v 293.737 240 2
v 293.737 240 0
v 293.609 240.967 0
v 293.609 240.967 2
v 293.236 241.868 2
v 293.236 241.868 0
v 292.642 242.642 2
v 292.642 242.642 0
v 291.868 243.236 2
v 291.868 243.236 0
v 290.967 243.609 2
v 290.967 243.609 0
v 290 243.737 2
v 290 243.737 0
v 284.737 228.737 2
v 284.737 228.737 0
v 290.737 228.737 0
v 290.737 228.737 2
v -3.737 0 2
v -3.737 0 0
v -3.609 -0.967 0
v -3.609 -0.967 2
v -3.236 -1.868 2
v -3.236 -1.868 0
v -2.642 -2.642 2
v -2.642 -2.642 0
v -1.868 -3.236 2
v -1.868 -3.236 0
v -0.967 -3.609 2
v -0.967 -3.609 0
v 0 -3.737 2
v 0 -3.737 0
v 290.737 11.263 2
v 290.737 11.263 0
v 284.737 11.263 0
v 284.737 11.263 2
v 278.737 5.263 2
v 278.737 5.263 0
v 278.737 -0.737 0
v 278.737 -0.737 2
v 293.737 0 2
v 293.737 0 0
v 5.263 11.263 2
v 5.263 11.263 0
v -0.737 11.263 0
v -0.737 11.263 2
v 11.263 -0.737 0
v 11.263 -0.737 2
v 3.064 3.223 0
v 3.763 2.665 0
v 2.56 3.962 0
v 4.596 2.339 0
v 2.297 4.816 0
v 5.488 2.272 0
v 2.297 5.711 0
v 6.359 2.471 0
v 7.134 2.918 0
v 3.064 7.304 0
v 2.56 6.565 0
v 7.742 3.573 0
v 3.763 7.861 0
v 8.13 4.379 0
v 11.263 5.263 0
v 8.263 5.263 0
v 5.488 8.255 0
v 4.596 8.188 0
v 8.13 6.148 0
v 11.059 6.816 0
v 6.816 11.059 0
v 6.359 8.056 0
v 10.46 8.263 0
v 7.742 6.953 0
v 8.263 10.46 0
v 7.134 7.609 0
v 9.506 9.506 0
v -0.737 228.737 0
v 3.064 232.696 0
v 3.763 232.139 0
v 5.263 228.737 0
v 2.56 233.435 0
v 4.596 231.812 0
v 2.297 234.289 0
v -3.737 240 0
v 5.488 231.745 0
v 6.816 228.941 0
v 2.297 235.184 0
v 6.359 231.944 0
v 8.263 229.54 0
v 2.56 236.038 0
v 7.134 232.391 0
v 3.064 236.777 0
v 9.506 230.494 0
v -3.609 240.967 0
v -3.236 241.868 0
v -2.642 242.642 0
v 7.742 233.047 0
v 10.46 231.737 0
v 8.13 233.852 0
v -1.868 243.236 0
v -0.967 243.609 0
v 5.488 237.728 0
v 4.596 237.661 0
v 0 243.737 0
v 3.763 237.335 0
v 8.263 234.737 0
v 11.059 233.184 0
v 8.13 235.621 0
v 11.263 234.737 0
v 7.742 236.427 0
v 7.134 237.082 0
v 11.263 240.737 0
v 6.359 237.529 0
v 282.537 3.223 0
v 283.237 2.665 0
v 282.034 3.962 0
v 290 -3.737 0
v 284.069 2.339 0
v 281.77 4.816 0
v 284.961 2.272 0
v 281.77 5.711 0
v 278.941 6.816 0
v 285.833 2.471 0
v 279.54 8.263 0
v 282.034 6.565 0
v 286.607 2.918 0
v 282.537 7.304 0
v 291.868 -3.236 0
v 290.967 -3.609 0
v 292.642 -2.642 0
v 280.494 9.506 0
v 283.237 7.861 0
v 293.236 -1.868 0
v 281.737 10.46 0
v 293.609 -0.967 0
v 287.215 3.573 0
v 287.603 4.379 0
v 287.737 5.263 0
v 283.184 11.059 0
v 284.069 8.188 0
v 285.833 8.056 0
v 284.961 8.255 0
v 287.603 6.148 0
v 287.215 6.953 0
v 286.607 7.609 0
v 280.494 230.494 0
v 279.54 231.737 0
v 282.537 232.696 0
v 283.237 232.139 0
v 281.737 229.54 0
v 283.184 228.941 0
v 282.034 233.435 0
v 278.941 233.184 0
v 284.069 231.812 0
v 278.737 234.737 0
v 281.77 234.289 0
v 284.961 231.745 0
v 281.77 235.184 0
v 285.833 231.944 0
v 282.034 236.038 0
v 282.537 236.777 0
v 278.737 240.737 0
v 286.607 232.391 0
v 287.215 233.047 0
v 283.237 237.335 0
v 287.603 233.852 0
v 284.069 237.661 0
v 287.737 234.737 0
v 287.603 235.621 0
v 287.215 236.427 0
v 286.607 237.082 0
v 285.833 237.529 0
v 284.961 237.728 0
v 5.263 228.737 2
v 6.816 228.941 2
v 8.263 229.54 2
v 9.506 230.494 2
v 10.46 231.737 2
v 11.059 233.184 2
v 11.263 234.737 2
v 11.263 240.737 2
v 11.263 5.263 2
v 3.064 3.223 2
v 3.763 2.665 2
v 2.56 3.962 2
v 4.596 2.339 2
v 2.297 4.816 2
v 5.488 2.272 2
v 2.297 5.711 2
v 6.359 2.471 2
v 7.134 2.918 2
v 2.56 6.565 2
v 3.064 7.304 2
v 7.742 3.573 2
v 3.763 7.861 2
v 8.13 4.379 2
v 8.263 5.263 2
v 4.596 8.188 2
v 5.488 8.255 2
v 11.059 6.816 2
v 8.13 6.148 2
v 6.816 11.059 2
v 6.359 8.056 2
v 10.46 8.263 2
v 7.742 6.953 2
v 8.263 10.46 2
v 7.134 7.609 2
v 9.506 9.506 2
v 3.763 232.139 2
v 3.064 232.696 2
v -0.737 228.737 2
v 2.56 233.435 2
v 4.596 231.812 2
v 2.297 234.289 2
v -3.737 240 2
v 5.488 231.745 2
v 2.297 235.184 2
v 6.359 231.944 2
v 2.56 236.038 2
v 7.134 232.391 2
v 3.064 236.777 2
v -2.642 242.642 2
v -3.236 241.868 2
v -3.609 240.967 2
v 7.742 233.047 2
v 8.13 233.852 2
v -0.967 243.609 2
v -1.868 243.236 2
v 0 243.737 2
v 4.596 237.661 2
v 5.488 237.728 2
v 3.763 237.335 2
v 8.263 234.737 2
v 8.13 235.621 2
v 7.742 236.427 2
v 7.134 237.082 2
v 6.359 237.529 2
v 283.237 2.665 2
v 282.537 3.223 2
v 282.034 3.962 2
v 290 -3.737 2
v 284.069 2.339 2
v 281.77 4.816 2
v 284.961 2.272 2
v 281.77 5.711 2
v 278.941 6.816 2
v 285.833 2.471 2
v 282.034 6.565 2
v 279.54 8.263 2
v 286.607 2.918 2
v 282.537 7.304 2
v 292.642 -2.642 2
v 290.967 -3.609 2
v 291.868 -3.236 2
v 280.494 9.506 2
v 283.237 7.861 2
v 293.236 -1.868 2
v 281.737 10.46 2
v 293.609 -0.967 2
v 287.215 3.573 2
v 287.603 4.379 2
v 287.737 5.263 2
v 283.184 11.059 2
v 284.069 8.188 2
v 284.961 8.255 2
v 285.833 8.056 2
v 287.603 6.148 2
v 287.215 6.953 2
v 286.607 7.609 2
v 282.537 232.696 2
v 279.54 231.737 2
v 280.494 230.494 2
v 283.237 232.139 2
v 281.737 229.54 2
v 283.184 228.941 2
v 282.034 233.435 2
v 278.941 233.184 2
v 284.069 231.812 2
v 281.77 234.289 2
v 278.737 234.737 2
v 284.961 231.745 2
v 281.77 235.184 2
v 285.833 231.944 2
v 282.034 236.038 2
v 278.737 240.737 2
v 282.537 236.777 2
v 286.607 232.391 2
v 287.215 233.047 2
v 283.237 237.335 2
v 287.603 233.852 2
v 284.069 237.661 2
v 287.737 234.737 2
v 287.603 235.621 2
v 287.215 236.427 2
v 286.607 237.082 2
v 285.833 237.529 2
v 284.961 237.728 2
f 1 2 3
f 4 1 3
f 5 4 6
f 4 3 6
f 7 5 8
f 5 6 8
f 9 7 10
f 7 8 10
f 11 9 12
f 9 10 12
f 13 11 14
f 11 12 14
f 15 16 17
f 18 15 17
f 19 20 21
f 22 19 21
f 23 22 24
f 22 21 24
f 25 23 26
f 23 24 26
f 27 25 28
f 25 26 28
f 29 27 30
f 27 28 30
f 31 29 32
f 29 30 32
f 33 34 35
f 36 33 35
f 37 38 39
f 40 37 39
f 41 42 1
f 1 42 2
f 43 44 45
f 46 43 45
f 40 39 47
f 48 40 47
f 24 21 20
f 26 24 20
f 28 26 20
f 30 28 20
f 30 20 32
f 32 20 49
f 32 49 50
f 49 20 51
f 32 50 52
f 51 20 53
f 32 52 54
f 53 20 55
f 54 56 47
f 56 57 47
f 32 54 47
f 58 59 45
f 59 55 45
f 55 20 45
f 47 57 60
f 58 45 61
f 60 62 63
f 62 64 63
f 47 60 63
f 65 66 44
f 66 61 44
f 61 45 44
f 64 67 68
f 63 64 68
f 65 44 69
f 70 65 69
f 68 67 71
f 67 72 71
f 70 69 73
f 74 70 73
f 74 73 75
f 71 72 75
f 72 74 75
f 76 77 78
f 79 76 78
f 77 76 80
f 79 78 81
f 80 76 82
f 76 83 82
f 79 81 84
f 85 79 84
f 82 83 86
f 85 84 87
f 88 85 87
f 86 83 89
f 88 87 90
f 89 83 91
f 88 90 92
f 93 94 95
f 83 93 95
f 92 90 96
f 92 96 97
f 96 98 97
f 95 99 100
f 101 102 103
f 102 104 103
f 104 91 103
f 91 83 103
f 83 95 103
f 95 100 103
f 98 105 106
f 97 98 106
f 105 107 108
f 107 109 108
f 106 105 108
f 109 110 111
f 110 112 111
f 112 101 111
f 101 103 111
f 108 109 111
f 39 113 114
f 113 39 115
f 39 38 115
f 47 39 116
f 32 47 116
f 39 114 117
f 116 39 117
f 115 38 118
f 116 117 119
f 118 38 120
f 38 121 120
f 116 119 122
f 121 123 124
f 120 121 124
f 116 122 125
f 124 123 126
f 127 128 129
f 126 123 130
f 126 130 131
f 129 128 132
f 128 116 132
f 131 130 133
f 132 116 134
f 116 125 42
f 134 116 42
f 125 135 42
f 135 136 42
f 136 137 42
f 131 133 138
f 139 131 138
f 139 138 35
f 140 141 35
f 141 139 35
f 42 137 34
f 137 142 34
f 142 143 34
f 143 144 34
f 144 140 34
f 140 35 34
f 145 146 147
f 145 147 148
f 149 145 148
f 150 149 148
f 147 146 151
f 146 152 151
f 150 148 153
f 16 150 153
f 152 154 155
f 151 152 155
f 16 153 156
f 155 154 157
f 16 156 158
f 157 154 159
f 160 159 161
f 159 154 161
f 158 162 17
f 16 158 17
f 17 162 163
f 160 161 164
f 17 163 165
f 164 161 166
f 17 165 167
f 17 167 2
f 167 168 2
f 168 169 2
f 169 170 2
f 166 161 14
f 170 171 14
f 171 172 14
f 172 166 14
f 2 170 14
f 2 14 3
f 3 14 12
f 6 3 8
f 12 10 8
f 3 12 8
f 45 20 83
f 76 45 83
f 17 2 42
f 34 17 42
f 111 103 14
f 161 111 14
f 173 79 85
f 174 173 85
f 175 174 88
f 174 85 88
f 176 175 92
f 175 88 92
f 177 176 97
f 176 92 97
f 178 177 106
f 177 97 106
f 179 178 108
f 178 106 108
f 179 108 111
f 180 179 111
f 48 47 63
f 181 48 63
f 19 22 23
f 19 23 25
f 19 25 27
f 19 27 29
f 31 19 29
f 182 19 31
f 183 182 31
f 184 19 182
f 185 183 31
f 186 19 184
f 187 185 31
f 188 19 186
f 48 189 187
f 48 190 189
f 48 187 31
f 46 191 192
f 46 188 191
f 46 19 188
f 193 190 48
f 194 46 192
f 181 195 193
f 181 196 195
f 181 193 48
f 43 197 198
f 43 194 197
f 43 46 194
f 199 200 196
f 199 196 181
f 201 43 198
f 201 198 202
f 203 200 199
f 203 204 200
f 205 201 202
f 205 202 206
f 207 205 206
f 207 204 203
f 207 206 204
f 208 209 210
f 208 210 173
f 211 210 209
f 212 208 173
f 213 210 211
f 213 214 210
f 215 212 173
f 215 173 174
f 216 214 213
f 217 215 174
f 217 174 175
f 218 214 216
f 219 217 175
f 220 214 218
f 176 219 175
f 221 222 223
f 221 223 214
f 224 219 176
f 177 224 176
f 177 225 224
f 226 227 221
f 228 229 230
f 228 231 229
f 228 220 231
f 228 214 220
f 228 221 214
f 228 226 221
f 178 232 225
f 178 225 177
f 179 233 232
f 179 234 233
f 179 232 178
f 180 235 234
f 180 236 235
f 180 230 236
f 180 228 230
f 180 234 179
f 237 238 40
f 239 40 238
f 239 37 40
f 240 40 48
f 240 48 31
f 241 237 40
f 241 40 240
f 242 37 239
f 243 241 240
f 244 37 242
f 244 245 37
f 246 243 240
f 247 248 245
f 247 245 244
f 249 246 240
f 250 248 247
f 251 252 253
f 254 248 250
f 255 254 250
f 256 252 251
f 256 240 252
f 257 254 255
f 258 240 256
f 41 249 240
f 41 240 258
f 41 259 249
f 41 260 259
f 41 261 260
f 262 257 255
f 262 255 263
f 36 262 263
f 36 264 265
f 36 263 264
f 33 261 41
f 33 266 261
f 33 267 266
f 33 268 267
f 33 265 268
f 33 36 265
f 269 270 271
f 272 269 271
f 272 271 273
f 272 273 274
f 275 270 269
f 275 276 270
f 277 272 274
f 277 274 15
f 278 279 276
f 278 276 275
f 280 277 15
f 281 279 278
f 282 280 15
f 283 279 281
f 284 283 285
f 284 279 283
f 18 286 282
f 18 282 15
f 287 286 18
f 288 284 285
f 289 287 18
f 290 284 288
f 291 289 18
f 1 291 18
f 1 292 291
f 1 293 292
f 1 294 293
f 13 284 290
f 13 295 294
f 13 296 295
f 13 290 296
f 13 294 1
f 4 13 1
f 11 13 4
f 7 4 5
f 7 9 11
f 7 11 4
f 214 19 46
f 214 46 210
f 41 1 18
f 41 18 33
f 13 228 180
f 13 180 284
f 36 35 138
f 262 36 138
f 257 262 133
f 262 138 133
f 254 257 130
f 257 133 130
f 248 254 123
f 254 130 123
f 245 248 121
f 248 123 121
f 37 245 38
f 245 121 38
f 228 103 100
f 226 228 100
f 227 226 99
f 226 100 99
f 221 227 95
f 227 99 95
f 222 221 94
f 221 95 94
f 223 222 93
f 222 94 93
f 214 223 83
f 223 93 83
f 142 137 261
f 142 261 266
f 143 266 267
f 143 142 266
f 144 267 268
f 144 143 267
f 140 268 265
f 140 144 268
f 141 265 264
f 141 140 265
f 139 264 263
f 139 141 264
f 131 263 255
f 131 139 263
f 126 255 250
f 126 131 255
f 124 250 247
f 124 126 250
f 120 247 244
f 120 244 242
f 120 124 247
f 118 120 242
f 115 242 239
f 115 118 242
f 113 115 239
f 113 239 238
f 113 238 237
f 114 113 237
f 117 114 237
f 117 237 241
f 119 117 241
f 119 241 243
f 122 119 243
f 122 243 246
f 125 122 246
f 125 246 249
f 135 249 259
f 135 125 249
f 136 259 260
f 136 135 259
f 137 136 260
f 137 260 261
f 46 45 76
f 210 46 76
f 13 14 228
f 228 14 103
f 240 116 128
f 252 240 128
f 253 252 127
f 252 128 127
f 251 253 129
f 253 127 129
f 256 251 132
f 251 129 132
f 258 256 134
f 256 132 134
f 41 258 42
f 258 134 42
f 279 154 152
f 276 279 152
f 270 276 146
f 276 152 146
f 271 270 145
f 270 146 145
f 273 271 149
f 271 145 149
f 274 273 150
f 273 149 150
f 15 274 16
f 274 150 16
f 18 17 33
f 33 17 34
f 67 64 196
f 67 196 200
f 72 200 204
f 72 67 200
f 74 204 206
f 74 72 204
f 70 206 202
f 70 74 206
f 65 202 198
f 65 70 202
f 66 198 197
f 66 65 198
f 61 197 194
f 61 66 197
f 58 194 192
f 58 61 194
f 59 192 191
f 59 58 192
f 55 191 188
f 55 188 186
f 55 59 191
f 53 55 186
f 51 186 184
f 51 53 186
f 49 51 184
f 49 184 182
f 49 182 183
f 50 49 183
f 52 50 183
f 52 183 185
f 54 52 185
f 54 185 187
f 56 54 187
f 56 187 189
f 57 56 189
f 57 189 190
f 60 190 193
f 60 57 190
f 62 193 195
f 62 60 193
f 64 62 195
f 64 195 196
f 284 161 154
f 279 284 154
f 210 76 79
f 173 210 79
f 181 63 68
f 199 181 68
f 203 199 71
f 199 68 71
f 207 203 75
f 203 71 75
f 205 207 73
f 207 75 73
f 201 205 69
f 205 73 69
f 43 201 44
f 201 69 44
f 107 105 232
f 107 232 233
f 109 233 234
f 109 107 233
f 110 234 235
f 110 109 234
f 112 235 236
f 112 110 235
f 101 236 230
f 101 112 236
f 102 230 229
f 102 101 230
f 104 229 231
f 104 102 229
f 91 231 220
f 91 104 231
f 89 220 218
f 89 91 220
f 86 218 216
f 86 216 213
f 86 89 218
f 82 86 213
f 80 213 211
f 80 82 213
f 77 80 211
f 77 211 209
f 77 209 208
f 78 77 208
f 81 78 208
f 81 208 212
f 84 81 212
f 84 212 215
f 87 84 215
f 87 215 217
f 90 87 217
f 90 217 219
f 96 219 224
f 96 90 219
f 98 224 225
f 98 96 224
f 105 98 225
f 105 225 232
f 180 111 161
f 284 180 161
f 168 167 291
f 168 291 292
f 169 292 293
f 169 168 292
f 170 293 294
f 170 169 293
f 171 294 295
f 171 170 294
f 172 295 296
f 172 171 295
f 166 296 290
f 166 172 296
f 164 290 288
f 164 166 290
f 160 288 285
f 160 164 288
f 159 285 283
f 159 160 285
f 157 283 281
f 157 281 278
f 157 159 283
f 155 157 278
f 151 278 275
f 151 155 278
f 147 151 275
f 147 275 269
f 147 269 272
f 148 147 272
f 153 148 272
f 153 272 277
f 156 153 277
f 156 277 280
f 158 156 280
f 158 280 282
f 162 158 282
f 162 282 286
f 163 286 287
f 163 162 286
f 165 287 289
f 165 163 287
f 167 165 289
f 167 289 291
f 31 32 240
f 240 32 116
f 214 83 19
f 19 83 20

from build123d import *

# Parameters (mm, degrees)
SKETCH1_R           = 3
BOSS_EXTRUDE1_DEPTH = 2


with BuildPart() as part:
    # Sketch1 → Boss-Extrude1 (new body)
    with BuildSketch(Plane.XY):
        with BuildLine():
            Line((-3.7366, 240), (-3.7366, 0))
            ThreePointArc((-3.7366, 0), (-2.642175199, -2.642175199), (0, -3.7366))
            Line((0, -3.7366), (290, -3.7366))
            ThreePointArc((290, -3.7366), (292.642175199, -2.642175199), (293.7366, 0))
            Line((293.7366, 0), (293.7366, 240))
            ThreePointArc((293.7366, 240), (292.642175199, 242.642175199), (290, 243.7366))
            Line((290, 243.7366), (0, 243.7366))
            ThreePointArc((0, 243.7366), (-2.642175199, 242.642175199), (-3.7366, 240))
        make_face()
        with Locations((284.7366, 5.2634)):
            Circle(SKETCH1_R, mode=Mode.SUBTRACT)
        with Locations((284.7366, 234.7366)):
            Circle(SKETCH1_R, mode=Mode.SUBTRACT)
        with Locations((5.2634, 234.7366)):
            Circle(SKETCH1_R, mode=Mode.SUBTRACT)
        with Locations((5.2634, 5.2634)):
            Circle(SKETCH1_R, mode=Mode.SUBTRACT)
        with BuildLine():
            Line((278.7366, -0.7366), (11.2634, -0.7366))
            Line((11.2634, -0.7366), (11.2634, 5.2634))
            ThreePointArc((11.2634, 5.2634), (9.506040687, 9.506040687), (5.2634, 11.2634))
            Line((5.2634, 11.2634), (-0.7366, 11.2634))
            Line((-0.7366, 11.2634), (-0.7366, 228.7366))
            Line((-0.7366, 228.7366), (5.2634, 228.7366))
            ThreePointArc((5.2634, 228.7366), (9.506040687, 230.493959313), (11.2634, 234.7366))
            Line((11.2634, 234.7366), (11.2634, 240.7366))
            Line((11.2634, 240.7366), (278.7366, 240.7366))
            Line((278.7366, 240.7366), (278.7366, 234.7366))
            ThreePointArc((278.7366, 234.7366), (280.493959313, 230.493959313), (284.7366, 228.7366))
            Line((284.7366, 228.7366), (290.7366, 228.7366))
            Line((290.7366, 228.7366), (290.7366, 11.2634))
            Line((290.7366, 11.2634), (284.7366, 11.2634))
            ThreePointArc((284.7366, 11.2634), (280.493959313, 9.506040687), (278.7366, 5.2634))
            Line((278.7366, 5.2634), (278.7366, -0.7366))
        make_face(mode=Mode.SUBTRACT)
    extrude(amount=BOSS_EXTRUDE1_DEPTH)


solid = part.part
